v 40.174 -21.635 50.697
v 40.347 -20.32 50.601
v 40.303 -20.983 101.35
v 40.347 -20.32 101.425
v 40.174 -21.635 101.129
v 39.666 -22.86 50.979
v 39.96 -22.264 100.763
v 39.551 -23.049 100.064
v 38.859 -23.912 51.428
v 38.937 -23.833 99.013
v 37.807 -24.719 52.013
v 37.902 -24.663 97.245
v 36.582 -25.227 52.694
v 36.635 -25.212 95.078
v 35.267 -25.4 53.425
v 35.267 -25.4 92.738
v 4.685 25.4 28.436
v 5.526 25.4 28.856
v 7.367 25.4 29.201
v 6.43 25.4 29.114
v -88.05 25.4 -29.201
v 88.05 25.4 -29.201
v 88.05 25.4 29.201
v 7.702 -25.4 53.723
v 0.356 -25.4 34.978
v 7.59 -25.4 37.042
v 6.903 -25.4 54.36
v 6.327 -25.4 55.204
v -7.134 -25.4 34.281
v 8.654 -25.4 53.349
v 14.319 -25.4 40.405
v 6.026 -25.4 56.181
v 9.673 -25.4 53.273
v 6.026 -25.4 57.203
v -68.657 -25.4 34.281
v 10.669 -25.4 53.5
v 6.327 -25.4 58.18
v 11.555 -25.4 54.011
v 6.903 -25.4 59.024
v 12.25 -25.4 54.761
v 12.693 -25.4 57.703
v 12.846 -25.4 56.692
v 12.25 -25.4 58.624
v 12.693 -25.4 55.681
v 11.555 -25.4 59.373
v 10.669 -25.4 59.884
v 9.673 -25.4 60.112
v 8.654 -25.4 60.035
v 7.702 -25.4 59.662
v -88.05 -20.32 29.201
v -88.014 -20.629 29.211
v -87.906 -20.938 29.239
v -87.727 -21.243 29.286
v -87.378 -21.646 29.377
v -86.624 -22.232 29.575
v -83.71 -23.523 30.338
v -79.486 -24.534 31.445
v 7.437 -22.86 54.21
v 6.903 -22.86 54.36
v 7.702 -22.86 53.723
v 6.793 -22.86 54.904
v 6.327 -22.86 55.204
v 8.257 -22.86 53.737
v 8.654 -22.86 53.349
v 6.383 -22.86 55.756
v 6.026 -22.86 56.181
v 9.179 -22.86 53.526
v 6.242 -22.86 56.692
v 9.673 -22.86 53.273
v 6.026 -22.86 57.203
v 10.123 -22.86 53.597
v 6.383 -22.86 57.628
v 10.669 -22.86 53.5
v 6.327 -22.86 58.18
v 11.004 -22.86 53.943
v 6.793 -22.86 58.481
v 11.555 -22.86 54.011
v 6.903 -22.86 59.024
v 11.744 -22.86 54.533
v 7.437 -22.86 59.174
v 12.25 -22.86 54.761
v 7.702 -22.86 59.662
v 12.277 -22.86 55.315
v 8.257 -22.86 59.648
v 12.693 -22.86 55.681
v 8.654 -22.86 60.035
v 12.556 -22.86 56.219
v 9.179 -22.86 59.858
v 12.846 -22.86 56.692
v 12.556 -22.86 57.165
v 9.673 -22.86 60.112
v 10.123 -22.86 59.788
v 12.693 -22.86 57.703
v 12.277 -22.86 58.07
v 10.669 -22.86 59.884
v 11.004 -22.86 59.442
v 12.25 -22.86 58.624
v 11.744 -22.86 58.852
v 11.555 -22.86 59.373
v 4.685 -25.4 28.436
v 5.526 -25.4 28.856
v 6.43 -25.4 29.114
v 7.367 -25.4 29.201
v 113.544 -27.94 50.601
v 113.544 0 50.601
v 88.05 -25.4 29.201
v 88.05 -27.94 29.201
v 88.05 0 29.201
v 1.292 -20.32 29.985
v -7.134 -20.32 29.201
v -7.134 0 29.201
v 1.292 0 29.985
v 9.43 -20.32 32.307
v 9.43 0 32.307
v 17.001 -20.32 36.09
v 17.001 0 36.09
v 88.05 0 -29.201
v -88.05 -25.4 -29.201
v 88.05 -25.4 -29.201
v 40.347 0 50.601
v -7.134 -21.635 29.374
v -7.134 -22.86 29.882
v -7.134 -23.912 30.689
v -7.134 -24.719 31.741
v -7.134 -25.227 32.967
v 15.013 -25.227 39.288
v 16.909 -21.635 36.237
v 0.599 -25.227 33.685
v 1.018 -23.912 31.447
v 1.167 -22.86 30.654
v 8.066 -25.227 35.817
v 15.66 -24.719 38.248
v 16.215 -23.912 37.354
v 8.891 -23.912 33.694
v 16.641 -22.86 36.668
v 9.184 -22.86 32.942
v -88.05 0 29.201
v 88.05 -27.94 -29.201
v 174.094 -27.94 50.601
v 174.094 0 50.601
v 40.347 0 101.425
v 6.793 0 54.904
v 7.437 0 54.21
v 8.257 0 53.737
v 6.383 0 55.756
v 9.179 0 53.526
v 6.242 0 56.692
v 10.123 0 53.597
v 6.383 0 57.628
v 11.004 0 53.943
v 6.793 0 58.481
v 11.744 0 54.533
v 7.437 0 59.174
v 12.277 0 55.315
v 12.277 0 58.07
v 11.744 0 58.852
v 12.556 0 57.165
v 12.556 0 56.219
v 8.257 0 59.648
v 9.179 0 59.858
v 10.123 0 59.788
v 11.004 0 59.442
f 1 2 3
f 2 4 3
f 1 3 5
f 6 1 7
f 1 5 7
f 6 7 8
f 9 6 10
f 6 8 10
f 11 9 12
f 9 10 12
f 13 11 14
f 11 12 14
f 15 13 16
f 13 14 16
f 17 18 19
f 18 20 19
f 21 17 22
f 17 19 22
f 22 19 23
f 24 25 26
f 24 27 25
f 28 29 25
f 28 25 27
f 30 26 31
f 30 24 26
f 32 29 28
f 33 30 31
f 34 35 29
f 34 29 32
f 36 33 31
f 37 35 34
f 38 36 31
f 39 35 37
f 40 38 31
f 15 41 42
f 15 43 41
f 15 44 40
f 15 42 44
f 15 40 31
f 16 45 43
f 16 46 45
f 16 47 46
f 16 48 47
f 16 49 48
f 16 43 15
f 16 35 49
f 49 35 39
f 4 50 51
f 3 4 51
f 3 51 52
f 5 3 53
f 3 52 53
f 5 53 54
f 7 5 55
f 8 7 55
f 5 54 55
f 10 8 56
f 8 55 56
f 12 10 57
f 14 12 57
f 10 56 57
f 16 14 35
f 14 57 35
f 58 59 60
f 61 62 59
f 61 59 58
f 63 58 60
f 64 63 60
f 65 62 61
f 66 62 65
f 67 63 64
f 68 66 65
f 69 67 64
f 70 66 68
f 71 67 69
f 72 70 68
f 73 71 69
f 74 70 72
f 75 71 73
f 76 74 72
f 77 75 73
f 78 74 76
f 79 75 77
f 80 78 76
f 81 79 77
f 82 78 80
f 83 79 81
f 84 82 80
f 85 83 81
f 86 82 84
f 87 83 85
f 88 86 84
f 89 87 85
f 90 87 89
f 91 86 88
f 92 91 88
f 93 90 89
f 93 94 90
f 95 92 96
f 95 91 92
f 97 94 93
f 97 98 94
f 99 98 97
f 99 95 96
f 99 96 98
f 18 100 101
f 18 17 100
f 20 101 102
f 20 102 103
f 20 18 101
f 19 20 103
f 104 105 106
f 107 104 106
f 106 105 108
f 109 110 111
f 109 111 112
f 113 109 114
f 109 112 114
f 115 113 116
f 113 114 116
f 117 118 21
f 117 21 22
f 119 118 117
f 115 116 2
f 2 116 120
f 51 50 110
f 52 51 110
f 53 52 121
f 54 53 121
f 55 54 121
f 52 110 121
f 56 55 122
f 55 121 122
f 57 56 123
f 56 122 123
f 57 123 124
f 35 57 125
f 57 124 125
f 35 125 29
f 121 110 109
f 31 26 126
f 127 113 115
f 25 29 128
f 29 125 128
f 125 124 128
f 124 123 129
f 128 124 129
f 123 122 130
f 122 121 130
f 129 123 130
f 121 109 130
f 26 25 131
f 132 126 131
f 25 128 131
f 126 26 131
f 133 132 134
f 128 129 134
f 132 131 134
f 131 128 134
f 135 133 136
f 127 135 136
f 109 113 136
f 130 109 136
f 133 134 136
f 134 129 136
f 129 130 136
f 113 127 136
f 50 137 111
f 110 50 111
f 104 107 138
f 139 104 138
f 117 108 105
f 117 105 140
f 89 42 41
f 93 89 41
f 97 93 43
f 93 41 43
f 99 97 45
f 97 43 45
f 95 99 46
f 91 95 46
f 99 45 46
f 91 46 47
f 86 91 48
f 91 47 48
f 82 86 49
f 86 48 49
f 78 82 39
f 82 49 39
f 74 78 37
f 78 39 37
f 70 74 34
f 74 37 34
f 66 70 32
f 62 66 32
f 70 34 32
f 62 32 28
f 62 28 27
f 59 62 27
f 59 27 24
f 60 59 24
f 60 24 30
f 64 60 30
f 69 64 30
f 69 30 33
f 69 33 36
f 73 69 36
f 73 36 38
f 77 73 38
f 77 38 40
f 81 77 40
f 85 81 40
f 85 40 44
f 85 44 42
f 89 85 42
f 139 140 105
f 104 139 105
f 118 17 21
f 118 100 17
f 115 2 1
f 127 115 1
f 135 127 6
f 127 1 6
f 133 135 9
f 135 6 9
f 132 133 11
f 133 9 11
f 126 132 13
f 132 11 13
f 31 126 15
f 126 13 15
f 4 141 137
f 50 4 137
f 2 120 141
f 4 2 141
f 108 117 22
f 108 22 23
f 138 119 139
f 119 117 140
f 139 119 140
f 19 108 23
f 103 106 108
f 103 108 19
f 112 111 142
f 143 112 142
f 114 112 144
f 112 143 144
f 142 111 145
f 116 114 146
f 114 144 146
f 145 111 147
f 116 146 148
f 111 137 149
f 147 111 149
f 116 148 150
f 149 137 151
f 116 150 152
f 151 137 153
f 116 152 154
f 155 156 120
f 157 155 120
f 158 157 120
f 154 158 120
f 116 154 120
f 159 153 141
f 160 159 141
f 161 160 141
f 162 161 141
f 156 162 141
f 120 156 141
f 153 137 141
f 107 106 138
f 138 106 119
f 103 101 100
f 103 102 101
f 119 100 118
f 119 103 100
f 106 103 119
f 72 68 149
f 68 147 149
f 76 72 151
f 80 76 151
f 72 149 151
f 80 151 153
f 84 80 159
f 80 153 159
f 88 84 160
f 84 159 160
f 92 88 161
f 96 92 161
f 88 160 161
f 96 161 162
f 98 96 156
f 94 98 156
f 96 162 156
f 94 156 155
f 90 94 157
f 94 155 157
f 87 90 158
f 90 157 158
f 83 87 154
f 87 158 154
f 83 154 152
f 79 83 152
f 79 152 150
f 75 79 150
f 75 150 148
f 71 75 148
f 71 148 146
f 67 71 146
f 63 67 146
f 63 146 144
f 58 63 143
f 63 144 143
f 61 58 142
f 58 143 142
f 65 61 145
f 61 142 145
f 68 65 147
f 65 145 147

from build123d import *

# Parameters (mm, degrees)
F1_DEPTH       = 25.4
F2_DEPTH       = 25.4
F3_DEPTH       = 27.94
F4_R           = 5.08
F5_R           = 5.08
F6_T1_DEPTH    = 58.0261887235
F6_T4_ANGLE    = 31.8620987779
F8_D           = 6.35
F8_CBORE_D     = 6.858
F8_CBORE_DEPTH = 2.54


# Not quite as in the source:
# - a fillet or chamfer that OpenCascade refuses, or shapes differently, is made with other operations: its cross-section is extruded or revolved along the edge and cut away or added


with BuildPart() as f1:
    # F0 (on Front) → F1 (new body, symmetric)
    with BuildSketch(Plane.XZ):
        Polygon((5.9164824631, 29.2013473809), (-88.0498662591, -29.2013473809), (88.0498662591, -29.2013473809), (88.0498662591, 29.2013473809), align=None)
    extrude(amount=F1_DEPTH, both=True)

    # F0 (on Front) → F3 (join)
    with BuildSketch(Plane.XZ):
        Polygon((88.0498662591, 29.2013473809), (88.0498662591, -29.2013473809), (174.0935258567, 50.6008043885), (113.5442811233, 50.6008043885), align=None)
    extrude(amount=F3_DEPTH)

    # F5
    f5_edges = [f1.edges().sort_by_distance(p)[0] for p in [
        (5.916482, 0, 29.201347),
    ]]
    fillet(f5_edges, radius=F5_R)


with BuildPart() as f2:
    # F0 (on Front) → F2 (new body)
    with BuildSketch(Plane.XZ):
        Polygon((40.3468944132, 101.4245226979), (-88.0498662591, 29.2013473809), (5.9164824631, 29.2013473809), (40.3468944132, 50.6008043885), align=None)
    extrude(amount=F2_DEPTH)

    # F4
    f4_edges = [f2.edges().sort_by_distance(p)[0] for p in [
        (-23.851486, -25.4, 65.312935),
        (40.346894, -25.4, 76.012664),
        (23.131688, -25.4, 39.901076),
        (-41.066692, -25.4, 29.201347),
    ]]
    fillet(f4_edges, radius=F4_R)

    # F6: fillet of radius 45.72 on 1 edges, made by hand

    # F6_s2 → F6_t1 (cut)
    with BuildSketch(Plane.XZ.offset(-32.6261887235)):
        with BuildLine():
            ThreePointArc((-7.1339930263, 29.2013473809), (5.4152490139, 30.9573288633), (17.0005261967, 36.0903883163))
            Line((17.0005261967, 36.0903883163), (5.9164824631, 29.2013473809))
            Line((5.9164824631, 29.2013473809), (-7.1339930263, 29.2013473809))
        make_face()
    extrude(amount=F6_T1_DEPTH, mode=Mode.SUBTRACT)

    # F6_s3 → F6_t4 (revolve, cut)
    with BuildSketch(Plane.YZ.offset(-7.1339930263)):
        with BuildLine():
            ThreePointArc((-25.4, 34.2813473809), (-23.9121024484, 30.6892449324), (-20.32, 29.2013473809))
            Line((-20.32, 29.2013473809), (-25.4, 29.2013473809))
            Line((-25.4, 29.2013473809), (-25.4, 34.2813473809))
        make_face()
    revolve(axis=Axis((-7.1339930263, -25.4, 74.9213473809), (0, -1, 0)), revolution_arc=F6_T4_ANGLE, mode=Mode.SUBTRACT)

    # F8 (through all)
    with Locations(Plane.XZ.offset(25.4)):
        with Locations((9.4166789204, 56.6921718419)):
            CounterBoreHole(F8_D / 2, F8_CBORE_D / 2, F8_CBORE_DEPTH)


solid = Compound([f1.part, f2.part])
